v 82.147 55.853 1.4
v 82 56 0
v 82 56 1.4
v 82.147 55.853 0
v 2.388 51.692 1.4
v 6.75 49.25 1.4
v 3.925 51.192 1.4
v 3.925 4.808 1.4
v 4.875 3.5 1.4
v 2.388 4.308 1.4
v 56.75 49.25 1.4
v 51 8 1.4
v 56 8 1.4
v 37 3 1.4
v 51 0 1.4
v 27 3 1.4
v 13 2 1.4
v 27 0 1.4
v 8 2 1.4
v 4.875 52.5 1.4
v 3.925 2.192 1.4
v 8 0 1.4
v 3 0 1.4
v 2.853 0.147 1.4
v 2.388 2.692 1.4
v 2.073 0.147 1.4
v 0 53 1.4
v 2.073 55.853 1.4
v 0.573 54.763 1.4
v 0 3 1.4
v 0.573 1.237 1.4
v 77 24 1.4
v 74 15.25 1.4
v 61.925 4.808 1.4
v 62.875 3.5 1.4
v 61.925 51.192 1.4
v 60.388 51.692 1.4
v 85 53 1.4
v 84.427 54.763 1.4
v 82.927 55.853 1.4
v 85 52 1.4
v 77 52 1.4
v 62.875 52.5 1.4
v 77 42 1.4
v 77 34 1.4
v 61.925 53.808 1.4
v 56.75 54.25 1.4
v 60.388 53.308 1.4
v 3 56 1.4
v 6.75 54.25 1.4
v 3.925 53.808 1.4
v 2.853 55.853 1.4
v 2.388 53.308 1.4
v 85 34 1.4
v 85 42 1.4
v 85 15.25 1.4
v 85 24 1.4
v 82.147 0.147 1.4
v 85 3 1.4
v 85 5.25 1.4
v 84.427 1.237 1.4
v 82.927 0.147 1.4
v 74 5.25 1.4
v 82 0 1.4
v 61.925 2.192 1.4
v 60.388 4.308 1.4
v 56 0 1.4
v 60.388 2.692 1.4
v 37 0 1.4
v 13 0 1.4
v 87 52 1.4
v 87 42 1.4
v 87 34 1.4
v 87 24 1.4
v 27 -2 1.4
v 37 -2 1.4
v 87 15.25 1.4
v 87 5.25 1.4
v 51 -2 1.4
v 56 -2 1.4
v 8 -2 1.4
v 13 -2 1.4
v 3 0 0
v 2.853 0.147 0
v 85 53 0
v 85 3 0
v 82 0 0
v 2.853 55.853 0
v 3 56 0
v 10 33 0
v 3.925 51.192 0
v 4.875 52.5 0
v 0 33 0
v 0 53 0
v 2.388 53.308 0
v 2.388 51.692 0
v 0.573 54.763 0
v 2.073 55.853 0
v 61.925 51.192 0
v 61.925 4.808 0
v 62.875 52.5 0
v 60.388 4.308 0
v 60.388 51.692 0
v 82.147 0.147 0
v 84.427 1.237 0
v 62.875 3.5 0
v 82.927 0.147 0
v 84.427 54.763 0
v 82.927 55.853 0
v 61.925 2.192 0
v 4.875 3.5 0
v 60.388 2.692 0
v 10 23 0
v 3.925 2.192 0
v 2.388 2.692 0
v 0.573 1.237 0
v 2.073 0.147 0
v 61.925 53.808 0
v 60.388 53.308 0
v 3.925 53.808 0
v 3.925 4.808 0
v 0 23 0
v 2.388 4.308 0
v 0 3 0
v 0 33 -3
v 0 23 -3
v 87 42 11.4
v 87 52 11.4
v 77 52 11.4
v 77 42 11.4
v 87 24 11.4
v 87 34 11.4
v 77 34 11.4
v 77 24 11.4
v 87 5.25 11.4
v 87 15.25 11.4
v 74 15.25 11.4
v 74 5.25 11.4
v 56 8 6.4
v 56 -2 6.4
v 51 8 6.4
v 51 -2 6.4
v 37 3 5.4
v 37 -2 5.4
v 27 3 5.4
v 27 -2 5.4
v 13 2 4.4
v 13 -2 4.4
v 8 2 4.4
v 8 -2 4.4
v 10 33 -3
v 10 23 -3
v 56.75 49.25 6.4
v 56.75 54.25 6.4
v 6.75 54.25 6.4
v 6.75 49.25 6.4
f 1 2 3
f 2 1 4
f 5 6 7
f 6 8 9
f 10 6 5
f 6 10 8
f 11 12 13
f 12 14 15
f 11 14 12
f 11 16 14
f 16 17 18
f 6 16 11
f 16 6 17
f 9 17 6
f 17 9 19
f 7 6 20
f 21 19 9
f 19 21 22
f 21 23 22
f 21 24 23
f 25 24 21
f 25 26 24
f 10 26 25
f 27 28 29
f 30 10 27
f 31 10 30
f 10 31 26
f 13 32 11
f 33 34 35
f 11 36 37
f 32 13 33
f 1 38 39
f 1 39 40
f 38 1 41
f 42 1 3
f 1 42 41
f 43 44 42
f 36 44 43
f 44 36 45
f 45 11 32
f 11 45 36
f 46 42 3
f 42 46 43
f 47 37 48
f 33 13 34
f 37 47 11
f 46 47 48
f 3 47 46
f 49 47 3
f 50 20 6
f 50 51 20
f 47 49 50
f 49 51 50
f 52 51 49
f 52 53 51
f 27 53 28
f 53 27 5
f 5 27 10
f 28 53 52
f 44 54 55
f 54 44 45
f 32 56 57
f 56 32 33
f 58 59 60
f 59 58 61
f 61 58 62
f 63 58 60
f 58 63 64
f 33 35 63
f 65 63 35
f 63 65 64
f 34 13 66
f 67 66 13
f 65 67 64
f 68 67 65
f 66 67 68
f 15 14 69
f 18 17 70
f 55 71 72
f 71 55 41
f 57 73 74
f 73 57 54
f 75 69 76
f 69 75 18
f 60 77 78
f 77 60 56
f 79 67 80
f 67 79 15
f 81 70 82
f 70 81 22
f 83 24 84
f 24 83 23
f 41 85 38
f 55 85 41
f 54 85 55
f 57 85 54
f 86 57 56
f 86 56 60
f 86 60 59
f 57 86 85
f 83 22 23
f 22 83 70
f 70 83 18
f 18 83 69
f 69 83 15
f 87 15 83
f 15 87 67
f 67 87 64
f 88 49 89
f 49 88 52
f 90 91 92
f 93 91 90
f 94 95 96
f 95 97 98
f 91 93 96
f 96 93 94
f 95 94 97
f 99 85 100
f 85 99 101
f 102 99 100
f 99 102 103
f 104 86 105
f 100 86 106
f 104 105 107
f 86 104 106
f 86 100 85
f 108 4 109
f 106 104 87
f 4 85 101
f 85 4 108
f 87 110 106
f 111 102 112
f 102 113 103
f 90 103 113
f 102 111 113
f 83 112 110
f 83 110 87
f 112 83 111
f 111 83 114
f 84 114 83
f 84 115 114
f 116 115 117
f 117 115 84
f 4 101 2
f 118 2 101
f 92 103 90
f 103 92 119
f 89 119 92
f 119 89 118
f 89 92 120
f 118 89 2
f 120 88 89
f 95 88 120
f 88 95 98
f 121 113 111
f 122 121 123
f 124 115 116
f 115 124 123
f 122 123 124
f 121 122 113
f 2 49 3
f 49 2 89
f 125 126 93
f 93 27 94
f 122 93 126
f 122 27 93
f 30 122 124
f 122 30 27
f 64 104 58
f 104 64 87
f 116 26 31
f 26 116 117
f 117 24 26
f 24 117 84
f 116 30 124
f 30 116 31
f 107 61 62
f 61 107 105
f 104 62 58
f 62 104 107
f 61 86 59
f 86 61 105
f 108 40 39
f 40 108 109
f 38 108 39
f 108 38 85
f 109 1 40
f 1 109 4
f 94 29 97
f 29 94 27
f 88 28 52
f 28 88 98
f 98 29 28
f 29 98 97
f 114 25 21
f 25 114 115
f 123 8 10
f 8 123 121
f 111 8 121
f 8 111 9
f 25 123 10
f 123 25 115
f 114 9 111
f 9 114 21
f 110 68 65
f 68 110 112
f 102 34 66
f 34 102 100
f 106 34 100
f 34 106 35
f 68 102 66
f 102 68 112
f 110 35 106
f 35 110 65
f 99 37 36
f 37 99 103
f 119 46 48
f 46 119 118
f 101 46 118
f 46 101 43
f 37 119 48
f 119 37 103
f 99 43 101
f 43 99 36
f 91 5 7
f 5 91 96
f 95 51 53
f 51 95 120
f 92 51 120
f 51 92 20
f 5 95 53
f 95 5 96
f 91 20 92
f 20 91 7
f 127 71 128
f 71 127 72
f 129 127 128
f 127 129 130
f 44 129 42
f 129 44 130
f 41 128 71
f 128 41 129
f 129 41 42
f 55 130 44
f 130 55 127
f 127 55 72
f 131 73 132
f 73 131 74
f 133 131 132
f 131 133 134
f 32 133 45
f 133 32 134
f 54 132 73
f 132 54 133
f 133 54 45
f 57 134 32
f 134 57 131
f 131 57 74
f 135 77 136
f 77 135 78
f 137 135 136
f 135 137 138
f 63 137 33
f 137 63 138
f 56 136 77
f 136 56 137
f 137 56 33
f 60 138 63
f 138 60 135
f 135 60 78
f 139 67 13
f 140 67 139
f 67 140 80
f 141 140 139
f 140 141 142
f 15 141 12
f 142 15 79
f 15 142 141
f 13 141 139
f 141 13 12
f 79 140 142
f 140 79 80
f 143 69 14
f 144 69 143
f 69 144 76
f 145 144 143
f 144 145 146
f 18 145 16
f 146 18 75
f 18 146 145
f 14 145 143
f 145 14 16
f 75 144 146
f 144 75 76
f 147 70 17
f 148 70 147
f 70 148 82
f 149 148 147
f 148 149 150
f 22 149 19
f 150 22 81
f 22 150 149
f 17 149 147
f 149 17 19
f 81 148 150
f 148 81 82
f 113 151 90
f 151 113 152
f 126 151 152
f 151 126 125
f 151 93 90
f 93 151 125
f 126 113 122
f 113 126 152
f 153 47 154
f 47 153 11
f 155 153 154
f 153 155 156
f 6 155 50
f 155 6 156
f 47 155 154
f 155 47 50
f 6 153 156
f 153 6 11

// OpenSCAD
// file: plate.scad
/*
  Simple method of rounding off corners. If the radius is zero or the radius more than half the width or height, a cube will be rendered instead.
*/

module plate(v, r=0) {
  if (r <= 0 || r > v[0] / 2 || r > v[1] / 2) {
    cube(v);
  }
  else {
    union() {
      linear_extrude(v[2])
        polygon(
          [
            [r, 0],
            [v[0]-r, 0],
            [v[0], r],
            [v[0], v[1]-r],
            [v[0]-r, v[1]],
            [r, v[1]],
            [0, v[1]-r],
            [0, r]
          ],
          [[0,1,2,3,4,5,6,7]]
        );
      translate([r, r, 0]) cylinder(r=r, h=v[2]);
      translate([v[0]-r, r, 0]) cylinder(r=r, h=v[2]);
      translate([v[0]-r, v[1]-r, 0]) cylinder(r=r, h=v[2]);
      translate([r, v[1]-r, 0]) cylinder(r=r, h=v[2]);
    }
  }
}

/*
// Quick rendering example. Corner is just beveled.
plate([20, 40, 2], r=2, $fn=4);

// Nicer looking corner but takes longer to render.
translate([-10, 0, 10]) rotate([0, 90, 0]) plate([10, 10, 3], r=3, $fn=24); 
*/
// main file
include <plate.scad>

rpi_bplus();

module rpi_bplus() {
  off_mounting_hole = 3.5;
  
  board = [85, 56, 1.4];
  usb = [10, 10, 10];
  eth = [13, 10, 10];
  audio = [5, 10, 5];
  hdmi = [10, 5, 4];
  m_usb = [5, 4, 3];
  m_sd = [10, 10, 3];
  gpio = [50, 5, 5];
  
  x = 0;
  y = 1;
  z = 2;
  
  difference() {
    plate(board, r=3);
    translate([off_mounting_hole, off_mounting_hole, 0])
      cylinder(d=2.75, h=board[z]);
    translate([off_mounting_hole + 58, off_mounting_hole, 0])
      cylinder(d=2.75, h=board[z]);
    translate([off_mounting_hole + 58, off_mounting_hole + 49, 0])
      cylinder(d=2.75, h=board[z]);
    translate([off_mounting_hole, off_mounting_hole + 49, 0])
      cylinder(d=2.75, h=board[z]);
  }
  
  translate([board[x]-usb[x]+2, 47-usb[y]/2, board[z]])
    cube(usb);
  translate([board[x]-usb[x]+2, 29-usb[y]/2, board[z]])
    cube(usb);
  translate([board[x]-eth[x]+2, 10.25-eth[y]/2, board[z]])
    cube(eth);
  translate([53.5-audio[x]/2, -2, board[z]])
    cube(audio);
  translate([32-hdmi[x]/2, -2, board[z]])
    cube(hdmi);
  translate([10.5-m_usb[x]/2, -2, board[z]])
    cube(m_usb);
  translate([0, 28-m_sd[y]/2,-m_sd[z]])
    cube(m_sd);
  translate([2.75+29-gpio[x]/2, 2.75+49-gpio[y]/2, board[z]])
    cube(gpio);
}
